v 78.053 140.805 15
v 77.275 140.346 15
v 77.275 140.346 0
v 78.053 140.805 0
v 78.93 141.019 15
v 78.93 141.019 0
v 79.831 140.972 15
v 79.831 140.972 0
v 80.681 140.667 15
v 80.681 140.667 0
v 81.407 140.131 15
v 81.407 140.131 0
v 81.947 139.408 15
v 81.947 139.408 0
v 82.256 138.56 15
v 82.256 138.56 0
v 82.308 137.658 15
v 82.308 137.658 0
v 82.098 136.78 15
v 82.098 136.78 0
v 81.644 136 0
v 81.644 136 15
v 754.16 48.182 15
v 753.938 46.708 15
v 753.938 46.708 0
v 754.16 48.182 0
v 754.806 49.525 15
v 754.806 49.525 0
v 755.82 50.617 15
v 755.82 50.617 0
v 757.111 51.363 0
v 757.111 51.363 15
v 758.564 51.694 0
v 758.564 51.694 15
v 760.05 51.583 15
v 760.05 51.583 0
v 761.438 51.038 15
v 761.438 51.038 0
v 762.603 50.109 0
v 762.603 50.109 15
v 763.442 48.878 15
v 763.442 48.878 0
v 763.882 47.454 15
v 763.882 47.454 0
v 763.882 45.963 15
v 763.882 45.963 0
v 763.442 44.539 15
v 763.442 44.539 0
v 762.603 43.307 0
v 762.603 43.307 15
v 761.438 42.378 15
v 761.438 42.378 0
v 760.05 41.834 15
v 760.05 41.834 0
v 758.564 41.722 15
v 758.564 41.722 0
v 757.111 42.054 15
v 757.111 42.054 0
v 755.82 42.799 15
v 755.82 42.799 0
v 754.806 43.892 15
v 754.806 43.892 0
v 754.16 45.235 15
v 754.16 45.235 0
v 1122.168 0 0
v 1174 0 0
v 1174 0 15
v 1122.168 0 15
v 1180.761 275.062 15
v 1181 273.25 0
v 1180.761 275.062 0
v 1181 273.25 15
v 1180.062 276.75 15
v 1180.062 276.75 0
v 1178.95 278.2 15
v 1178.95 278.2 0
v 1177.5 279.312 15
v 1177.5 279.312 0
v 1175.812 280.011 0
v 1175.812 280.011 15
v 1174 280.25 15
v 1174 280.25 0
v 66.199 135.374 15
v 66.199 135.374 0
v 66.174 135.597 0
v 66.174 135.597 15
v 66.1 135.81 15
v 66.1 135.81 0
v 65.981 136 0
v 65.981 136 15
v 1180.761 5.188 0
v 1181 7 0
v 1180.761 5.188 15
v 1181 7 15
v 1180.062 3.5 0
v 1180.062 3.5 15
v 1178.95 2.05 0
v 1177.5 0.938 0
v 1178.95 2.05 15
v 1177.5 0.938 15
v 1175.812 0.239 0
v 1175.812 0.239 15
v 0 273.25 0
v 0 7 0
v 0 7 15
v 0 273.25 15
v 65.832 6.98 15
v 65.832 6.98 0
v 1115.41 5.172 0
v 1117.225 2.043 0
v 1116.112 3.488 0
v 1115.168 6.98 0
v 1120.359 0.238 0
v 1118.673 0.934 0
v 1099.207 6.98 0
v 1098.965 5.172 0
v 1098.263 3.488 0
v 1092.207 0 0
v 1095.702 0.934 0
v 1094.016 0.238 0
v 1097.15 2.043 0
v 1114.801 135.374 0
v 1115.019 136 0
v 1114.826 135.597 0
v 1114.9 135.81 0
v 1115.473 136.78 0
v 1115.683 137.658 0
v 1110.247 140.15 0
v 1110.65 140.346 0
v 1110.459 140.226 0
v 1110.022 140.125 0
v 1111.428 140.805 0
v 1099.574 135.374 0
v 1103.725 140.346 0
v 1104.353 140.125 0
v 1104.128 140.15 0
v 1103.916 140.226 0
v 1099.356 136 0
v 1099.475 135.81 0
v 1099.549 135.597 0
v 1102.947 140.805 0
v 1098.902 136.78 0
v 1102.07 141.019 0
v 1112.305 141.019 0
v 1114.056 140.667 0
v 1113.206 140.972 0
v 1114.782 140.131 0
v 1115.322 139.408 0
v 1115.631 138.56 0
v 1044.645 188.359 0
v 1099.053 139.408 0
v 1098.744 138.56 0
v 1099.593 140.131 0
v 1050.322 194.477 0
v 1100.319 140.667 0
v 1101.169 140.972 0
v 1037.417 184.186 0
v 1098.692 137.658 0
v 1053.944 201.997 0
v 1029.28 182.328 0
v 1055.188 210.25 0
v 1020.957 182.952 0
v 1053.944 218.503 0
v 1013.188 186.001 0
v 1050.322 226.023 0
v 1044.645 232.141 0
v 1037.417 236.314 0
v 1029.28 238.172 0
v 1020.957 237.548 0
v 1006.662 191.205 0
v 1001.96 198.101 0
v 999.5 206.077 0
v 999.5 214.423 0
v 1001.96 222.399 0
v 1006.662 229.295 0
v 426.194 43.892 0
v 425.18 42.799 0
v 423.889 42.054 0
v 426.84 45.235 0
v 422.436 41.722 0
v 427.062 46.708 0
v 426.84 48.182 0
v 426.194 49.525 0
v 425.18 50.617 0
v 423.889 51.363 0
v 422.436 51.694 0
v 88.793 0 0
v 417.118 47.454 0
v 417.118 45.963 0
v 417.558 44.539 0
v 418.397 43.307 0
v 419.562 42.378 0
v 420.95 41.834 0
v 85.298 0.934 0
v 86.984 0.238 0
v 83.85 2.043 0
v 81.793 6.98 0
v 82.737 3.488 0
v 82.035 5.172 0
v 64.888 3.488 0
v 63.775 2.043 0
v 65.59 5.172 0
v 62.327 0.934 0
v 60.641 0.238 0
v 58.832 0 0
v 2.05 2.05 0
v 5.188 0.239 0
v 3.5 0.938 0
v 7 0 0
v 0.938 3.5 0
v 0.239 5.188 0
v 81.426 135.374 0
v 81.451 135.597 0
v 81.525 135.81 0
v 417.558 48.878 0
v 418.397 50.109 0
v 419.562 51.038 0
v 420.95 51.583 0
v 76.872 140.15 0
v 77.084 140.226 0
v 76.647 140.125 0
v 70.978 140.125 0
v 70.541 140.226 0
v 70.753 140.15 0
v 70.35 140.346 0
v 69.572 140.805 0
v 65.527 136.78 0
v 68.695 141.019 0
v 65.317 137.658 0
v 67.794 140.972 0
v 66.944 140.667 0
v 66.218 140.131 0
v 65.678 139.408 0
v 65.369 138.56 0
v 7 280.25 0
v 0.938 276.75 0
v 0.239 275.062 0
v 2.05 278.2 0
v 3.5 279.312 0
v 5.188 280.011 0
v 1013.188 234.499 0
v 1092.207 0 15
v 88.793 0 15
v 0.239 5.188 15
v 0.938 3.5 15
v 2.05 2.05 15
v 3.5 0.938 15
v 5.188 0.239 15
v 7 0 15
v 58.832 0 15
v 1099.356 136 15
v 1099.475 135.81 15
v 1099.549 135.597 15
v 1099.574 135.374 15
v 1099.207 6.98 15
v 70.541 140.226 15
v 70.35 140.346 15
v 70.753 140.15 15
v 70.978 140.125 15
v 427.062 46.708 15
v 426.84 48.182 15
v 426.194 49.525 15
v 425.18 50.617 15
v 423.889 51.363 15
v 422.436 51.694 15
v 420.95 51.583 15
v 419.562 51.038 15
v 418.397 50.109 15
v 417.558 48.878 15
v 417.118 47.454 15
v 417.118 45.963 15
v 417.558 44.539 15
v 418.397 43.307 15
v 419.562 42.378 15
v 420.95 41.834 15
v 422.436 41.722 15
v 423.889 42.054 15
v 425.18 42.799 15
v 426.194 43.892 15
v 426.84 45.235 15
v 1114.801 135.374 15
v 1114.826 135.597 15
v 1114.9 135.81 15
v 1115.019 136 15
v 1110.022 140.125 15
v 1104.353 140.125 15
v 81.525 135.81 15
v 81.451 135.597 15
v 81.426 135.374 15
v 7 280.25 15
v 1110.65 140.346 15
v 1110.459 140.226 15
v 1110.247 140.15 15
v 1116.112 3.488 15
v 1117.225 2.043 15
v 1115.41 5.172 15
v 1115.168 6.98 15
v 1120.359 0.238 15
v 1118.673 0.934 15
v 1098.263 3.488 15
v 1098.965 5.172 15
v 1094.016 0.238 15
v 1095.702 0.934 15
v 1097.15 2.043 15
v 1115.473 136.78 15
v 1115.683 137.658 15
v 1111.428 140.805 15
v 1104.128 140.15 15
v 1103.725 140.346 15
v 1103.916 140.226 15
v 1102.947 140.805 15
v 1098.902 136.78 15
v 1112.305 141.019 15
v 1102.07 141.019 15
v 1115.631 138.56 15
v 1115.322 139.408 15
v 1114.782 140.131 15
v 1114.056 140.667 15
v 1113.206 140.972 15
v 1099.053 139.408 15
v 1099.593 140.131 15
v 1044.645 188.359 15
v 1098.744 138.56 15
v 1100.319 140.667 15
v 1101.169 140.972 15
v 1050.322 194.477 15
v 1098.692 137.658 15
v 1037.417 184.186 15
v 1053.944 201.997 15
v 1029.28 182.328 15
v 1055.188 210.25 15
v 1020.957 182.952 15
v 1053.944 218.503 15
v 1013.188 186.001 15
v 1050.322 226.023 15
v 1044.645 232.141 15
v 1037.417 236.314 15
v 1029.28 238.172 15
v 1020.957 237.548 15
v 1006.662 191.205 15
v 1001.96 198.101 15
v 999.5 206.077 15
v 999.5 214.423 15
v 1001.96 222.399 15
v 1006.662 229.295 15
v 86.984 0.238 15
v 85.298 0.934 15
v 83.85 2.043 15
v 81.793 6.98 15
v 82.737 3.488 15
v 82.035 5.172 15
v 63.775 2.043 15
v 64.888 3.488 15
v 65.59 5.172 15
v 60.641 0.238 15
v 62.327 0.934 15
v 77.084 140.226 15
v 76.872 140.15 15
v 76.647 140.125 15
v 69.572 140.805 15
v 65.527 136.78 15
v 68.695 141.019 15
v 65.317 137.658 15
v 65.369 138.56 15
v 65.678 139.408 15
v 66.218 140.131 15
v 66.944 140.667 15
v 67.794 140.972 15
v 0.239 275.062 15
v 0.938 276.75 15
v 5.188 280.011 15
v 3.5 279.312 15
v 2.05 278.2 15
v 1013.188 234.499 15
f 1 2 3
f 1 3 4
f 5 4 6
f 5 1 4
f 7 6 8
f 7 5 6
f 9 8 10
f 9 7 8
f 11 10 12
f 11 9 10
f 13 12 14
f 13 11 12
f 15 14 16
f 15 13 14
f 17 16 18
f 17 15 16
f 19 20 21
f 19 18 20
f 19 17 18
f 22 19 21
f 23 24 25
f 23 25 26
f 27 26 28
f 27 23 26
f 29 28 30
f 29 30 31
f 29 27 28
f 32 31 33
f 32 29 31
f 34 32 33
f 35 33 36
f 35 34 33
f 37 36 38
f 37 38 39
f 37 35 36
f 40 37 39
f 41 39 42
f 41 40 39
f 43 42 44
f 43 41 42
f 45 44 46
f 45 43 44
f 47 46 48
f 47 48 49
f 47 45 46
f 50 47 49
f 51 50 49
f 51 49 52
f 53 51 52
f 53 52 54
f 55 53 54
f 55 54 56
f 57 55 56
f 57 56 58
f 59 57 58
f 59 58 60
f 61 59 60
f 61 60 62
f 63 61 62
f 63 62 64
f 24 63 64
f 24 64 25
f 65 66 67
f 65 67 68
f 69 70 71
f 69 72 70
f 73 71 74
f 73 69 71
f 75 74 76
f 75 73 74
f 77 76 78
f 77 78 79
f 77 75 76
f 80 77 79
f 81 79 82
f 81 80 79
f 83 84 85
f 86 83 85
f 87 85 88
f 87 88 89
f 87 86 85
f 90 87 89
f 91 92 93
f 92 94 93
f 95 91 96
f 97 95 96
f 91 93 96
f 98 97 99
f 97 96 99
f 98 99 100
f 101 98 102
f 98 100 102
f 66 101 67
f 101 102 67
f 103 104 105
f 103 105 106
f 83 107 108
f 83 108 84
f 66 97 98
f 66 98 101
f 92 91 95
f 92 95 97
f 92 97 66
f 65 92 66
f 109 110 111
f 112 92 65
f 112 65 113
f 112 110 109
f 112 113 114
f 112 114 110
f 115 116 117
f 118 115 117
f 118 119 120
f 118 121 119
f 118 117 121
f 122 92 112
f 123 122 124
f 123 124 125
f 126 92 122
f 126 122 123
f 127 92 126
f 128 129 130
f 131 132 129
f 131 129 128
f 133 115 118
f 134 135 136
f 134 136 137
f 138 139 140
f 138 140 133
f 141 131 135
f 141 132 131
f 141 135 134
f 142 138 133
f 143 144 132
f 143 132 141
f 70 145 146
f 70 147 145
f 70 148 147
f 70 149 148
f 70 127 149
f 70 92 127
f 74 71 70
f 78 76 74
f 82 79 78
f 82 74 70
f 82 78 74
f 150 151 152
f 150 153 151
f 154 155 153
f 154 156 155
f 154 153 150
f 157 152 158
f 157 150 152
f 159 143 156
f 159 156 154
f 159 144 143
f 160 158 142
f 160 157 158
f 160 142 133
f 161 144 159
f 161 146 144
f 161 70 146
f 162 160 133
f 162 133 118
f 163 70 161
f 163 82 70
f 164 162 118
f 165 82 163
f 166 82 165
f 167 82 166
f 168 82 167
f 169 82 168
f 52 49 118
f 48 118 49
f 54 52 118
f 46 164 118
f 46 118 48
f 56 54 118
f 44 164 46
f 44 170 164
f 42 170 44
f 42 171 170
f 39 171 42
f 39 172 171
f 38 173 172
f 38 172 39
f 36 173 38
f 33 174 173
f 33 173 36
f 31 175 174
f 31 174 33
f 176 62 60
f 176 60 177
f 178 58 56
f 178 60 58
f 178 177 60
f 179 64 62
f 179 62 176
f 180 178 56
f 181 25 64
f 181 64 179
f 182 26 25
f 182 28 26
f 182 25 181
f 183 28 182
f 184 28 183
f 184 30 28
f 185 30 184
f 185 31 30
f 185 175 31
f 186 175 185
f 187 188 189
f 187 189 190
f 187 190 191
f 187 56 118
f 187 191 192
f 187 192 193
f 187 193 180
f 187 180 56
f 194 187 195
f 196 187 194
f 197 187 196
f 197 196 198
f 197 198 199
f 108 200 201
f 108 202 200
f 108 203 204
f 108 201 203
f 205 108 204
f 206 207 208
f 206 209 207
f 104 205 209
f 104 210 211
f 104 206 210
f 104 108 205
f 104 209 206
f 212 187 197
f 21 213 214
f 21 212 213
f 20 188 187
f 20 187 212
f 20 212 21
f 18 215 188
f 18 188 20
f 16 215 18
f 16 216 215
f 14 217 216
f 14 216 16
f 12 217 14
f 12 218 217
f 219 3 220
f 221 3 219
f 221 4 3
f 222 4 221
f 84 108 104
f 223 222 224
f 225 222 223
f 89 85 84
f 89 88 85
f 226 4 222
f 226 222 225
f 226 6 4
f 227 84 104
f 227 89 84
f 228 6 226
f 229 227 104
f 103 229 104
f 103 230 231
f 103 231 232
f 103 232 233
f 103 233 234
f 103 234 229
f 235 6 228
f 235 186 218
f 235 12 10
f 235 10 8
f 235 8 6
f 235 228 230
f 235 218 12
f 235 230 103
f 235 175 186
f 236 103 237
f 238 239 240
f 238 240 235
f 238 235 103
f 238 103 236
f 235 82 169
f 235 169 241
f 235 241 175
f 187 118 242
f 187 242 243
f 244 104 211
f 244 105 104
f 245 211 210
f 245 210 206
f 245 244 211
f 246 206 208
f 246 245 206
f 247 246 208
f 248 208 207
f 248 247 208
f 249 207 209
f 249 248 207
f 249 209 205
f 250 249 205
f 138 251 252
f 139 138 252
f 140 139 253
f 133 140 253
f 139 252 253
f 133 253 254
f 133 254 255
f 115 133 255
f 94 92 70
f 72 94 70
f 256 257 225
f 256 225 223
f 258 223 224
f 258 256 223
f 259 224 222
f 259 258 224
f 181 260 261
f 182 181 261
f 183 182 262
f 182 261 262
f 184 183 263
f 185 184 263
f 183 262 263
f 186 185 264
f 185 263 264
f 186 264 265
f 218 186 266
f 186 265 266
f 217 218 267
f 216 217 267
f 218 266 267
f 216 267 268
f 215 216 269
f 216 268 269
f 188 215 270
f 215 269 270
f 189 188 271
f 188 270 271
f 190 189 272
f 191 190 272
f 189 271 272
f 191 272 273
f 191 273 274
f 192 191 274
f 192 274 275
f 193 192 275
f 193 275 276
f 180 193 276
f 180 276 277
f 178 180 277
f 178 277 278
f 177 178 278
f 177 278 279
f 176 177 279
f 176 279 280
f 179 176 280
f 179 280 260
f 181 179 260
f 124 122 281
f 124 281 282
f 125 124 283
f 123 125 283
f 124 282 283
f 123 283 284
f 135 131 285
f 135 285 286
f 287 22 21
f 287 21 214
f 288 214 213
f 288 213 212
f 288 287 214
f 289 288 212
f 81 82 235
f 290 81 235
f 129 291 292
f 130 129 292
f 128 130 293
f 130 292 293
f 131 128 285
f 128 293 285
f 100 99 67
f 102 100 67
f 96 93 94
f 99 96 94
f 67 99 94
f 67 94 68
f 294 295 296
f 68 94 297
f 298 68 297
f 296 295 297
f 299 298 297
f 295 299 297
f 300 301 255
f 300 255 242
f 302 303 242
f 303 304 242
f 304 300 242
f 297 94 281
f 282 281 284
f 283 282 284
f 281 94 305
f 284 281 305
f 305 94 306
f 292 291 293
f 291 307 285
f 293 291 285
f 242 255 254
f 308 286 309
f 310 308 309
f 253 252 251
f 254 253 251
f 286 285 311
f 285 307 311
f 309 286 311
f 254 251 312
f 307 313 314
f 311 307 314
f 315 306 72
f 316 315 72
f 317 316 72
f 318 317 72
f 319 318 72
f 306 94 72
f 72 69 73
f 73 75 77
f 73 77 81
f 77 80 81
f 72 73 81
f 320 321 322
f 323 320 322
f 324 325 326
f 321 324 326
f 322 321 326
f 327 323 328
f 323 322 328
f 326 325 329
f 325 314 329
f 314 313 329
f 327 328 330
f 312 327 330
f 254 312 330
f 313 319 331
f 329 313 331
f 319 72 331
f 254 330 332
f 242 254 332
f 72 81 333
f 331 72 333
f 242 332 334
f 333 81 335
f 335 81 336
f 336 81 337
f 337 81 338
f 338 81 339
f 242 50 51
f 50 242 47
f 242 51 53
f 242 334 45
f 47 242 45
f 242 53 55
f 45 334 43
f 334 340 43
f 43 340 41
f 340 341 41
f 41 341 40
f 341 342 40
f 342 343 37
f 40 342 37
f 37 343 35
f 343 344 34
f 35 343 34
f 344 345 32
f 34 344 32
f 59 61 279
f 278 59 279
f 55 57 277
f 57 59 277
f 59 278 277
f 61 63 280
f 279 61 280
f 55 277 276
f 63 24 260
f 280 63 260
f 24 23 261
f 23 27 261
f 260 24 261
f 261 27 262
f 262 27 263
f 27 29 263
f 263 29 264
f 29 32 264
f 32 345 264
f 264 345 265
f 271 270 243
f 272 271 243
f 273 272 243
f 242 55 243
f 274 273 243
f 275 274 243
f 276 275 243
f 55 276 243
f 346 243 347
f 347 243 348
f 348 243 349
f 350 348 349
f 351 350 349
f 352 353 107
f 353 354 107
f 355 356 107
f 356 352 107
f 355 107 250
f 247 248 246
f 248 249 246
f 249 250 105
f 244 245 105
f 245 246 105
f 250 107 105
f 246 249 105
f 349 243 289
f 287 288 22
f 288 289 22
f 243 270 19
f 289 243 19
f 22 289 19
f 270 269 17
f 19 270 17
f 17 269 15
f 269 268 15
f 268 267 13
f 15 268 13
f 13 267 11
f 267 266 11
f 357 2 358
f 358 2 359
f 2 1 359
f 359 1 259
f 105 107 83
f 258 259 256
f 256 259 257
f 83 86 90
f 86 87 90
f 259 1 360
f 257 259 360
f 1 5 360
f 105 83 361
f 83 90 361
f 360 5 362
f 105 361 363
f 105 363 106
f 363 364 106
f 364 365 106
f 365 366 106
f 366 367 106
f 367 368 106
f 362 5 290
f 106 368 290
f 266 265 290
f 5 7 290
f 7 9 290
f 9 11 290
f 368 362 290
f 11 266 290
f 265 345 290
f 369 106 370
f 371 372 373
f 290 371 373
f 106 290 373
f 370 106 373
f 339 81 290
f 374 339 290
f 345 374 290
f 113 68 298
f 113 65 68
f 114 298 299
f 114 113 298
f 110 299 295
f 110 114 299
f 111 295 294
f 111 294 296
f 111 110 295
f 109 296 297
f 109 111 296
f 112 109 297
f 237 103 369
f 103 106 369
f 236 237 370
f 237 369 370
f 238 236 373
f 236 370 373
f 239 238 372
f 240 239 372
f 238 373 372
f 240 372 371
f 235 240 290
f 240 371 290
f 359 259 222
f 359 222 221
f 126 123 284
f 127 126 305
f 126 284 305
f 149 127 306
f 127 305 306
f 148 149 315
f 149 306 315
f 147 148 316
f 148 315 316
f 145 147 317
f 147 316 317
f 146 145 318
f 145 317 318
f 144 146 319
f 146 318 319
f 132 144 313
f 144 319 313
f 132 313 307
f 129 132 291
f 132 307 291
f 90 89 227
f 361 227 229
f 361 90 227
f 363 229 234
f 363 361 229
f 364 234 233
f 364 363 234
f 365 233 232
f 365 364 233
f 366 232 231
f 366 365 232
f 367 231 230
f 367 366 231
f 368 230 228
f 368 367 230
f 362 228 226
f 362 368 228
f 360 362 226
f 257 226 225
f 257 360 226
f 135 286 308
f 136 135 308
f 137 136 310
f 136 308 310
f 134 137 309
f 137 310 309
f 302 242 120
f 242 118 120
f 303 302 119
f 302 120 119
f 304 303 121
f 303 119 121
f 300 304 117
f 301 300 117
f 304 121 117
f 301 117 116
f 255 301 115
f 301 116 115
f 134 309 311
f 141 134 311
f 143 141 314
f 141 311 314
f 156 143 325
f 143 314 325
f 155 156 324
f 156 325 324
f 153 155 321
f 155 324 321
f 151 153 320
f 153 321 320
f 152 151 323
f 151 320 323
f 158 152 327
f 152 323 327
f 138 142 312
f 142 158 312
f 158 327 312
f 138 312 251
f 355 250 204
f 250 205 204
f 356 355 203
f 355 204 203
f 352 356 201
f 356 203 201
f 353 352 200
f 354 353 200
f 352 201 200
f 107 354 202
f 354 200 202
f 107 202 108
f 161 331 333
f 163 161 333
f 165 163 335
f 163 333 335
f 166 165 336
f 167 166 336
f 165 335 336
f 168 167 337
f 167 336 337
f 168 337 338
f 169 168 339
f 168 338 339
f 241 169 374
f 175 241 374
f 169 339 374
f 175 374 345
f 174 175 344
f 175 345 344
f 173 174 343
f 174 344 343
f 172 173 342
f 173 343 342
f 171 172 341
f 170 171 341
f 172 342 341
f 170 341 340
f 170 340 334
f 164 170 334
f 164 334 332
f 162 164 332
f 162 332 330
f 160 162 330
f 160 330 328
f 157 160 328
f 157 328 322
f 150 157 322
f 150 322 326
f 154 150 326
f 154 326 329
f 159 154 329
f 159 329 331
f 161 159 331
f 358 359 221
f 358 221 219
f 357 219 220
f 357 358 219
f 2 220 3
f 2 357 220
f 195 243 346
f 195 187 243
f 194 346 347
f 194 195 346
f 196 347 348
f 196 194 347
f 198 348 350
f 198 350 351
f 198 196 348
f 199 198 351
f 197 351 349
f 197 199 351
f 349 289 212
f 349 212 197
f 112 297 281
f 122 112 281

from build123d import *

# Parameters (mm, degrees)
ESQUISSE1_W         = 590.5
ESQUISSE1_H         = 280.25
BOSS_EXTRUDE1_DEPTH = 15
CUT_EXTRUDE1_DEPTH  = 654.800667253
ESQUISSE3_R         = 5
CUT_EXTRUDE2_DEPTH  = 654.800667253
CONG_1_R            = 7
SKETCH1_R           = 28
CUT_EXTRUDE3_DEPTH  = 1214.888818014


with BuildPart() as part:
    # Esquisse1 → Boss-Extrude1 (new body)
    with BuildSketch(Plane.XY):
        with Locations((295.25, 140.125)):
            Rectangle(ESQUISSE1_W, ESQUISSE1_H)
    extrude(amount=BOSS_EXTRUDE1_DEPTH)

    # Esquisse2 → Cut-Extrude1 (cut, through all)
    with BuildSketch(Plane.XY.offset(15)):
        with BuildLine():
            Line((70.977649355, 140.125), (76.647350645, 140.125))
            ThreePointArc((76.647350645, 140.125), (76.980108702, 140.181987765), (77.274940482, 140.346455848))
            ThreePointArc((77.274940482, 140.346455848), (81.406698158, 140.130786526), (81.644207297, 136.00022674))
            ThreePointArc((81.644207297, 136.00022674), (81.481699427, 135.705678195), (81.426062442, 135.373906919))
            Line((81.426062442, 135.373906919), (81.8125, 0))
            Line((81.8125, 0), (65.8125, 0))
            Line((65.8125, 0), (66.198937558, 135.373906919))
            ThreePointArc((66.198937558, 135.373906919), (66.143300573, 135.705678195), (65.980792703, 136.00022674))
            ThreePointArc((65.980792703, 136.00022674), (66.218301842, 140.130786526), (70.350059518, 140.346455848))
            ThreePointArc((70.350059518, 140.346455848), (70.644891298, 140.181987765), (70.977649355, 140.125))
        make_face()
    extrude(amount=-CUT_EXTRUDE1_DEPTH, mode=Mode.SUBTRACT)

    # Esquisse3 → Cut-Extrude2 (cut, through all)
    with BuildSketch(Plane.XY.offset(15)):
        with Locations((422.0625, 46.708333333)):
            Circle(ESQUISSE3_R)
    extrude(amount=-CUT_EXTRUDE2_DEPTH, mode=Mode.SUBTRACT)

    # Cong_1
    cong_1_edges = [part.edges().sort_by_distance(p)[0] for p in [
        (81.8125, 0, 7.5),
        (65.8125, 0, 7.5),
        (0, 280.25, 7.5),
        (0, 0, 7.5),
    ]]
    fillet(cong_1_edges, radius=CONG_1_R)

    # Sym_trie1: part across plane


with BuildPart() as part_1:
    add(part.part)
    add(part.part.mirror(Plane(origin=(590.5, 0, 15), x_dir=(0, 0, 1), z_dir=(-1, 0, 0))))

    # Sketch1 → Cut-Extrude3 (cut, through all)
    with BuildSketch(Plane.XY.offset(15)):
        with Locations((1027.1875, 210.25)):
            Circle(SKETCH1_R)
    extrude(amount=-CUT_EXTRUDE3_DEPTH, mode=Mode.SUBTRACT)


solid = part_1.part
